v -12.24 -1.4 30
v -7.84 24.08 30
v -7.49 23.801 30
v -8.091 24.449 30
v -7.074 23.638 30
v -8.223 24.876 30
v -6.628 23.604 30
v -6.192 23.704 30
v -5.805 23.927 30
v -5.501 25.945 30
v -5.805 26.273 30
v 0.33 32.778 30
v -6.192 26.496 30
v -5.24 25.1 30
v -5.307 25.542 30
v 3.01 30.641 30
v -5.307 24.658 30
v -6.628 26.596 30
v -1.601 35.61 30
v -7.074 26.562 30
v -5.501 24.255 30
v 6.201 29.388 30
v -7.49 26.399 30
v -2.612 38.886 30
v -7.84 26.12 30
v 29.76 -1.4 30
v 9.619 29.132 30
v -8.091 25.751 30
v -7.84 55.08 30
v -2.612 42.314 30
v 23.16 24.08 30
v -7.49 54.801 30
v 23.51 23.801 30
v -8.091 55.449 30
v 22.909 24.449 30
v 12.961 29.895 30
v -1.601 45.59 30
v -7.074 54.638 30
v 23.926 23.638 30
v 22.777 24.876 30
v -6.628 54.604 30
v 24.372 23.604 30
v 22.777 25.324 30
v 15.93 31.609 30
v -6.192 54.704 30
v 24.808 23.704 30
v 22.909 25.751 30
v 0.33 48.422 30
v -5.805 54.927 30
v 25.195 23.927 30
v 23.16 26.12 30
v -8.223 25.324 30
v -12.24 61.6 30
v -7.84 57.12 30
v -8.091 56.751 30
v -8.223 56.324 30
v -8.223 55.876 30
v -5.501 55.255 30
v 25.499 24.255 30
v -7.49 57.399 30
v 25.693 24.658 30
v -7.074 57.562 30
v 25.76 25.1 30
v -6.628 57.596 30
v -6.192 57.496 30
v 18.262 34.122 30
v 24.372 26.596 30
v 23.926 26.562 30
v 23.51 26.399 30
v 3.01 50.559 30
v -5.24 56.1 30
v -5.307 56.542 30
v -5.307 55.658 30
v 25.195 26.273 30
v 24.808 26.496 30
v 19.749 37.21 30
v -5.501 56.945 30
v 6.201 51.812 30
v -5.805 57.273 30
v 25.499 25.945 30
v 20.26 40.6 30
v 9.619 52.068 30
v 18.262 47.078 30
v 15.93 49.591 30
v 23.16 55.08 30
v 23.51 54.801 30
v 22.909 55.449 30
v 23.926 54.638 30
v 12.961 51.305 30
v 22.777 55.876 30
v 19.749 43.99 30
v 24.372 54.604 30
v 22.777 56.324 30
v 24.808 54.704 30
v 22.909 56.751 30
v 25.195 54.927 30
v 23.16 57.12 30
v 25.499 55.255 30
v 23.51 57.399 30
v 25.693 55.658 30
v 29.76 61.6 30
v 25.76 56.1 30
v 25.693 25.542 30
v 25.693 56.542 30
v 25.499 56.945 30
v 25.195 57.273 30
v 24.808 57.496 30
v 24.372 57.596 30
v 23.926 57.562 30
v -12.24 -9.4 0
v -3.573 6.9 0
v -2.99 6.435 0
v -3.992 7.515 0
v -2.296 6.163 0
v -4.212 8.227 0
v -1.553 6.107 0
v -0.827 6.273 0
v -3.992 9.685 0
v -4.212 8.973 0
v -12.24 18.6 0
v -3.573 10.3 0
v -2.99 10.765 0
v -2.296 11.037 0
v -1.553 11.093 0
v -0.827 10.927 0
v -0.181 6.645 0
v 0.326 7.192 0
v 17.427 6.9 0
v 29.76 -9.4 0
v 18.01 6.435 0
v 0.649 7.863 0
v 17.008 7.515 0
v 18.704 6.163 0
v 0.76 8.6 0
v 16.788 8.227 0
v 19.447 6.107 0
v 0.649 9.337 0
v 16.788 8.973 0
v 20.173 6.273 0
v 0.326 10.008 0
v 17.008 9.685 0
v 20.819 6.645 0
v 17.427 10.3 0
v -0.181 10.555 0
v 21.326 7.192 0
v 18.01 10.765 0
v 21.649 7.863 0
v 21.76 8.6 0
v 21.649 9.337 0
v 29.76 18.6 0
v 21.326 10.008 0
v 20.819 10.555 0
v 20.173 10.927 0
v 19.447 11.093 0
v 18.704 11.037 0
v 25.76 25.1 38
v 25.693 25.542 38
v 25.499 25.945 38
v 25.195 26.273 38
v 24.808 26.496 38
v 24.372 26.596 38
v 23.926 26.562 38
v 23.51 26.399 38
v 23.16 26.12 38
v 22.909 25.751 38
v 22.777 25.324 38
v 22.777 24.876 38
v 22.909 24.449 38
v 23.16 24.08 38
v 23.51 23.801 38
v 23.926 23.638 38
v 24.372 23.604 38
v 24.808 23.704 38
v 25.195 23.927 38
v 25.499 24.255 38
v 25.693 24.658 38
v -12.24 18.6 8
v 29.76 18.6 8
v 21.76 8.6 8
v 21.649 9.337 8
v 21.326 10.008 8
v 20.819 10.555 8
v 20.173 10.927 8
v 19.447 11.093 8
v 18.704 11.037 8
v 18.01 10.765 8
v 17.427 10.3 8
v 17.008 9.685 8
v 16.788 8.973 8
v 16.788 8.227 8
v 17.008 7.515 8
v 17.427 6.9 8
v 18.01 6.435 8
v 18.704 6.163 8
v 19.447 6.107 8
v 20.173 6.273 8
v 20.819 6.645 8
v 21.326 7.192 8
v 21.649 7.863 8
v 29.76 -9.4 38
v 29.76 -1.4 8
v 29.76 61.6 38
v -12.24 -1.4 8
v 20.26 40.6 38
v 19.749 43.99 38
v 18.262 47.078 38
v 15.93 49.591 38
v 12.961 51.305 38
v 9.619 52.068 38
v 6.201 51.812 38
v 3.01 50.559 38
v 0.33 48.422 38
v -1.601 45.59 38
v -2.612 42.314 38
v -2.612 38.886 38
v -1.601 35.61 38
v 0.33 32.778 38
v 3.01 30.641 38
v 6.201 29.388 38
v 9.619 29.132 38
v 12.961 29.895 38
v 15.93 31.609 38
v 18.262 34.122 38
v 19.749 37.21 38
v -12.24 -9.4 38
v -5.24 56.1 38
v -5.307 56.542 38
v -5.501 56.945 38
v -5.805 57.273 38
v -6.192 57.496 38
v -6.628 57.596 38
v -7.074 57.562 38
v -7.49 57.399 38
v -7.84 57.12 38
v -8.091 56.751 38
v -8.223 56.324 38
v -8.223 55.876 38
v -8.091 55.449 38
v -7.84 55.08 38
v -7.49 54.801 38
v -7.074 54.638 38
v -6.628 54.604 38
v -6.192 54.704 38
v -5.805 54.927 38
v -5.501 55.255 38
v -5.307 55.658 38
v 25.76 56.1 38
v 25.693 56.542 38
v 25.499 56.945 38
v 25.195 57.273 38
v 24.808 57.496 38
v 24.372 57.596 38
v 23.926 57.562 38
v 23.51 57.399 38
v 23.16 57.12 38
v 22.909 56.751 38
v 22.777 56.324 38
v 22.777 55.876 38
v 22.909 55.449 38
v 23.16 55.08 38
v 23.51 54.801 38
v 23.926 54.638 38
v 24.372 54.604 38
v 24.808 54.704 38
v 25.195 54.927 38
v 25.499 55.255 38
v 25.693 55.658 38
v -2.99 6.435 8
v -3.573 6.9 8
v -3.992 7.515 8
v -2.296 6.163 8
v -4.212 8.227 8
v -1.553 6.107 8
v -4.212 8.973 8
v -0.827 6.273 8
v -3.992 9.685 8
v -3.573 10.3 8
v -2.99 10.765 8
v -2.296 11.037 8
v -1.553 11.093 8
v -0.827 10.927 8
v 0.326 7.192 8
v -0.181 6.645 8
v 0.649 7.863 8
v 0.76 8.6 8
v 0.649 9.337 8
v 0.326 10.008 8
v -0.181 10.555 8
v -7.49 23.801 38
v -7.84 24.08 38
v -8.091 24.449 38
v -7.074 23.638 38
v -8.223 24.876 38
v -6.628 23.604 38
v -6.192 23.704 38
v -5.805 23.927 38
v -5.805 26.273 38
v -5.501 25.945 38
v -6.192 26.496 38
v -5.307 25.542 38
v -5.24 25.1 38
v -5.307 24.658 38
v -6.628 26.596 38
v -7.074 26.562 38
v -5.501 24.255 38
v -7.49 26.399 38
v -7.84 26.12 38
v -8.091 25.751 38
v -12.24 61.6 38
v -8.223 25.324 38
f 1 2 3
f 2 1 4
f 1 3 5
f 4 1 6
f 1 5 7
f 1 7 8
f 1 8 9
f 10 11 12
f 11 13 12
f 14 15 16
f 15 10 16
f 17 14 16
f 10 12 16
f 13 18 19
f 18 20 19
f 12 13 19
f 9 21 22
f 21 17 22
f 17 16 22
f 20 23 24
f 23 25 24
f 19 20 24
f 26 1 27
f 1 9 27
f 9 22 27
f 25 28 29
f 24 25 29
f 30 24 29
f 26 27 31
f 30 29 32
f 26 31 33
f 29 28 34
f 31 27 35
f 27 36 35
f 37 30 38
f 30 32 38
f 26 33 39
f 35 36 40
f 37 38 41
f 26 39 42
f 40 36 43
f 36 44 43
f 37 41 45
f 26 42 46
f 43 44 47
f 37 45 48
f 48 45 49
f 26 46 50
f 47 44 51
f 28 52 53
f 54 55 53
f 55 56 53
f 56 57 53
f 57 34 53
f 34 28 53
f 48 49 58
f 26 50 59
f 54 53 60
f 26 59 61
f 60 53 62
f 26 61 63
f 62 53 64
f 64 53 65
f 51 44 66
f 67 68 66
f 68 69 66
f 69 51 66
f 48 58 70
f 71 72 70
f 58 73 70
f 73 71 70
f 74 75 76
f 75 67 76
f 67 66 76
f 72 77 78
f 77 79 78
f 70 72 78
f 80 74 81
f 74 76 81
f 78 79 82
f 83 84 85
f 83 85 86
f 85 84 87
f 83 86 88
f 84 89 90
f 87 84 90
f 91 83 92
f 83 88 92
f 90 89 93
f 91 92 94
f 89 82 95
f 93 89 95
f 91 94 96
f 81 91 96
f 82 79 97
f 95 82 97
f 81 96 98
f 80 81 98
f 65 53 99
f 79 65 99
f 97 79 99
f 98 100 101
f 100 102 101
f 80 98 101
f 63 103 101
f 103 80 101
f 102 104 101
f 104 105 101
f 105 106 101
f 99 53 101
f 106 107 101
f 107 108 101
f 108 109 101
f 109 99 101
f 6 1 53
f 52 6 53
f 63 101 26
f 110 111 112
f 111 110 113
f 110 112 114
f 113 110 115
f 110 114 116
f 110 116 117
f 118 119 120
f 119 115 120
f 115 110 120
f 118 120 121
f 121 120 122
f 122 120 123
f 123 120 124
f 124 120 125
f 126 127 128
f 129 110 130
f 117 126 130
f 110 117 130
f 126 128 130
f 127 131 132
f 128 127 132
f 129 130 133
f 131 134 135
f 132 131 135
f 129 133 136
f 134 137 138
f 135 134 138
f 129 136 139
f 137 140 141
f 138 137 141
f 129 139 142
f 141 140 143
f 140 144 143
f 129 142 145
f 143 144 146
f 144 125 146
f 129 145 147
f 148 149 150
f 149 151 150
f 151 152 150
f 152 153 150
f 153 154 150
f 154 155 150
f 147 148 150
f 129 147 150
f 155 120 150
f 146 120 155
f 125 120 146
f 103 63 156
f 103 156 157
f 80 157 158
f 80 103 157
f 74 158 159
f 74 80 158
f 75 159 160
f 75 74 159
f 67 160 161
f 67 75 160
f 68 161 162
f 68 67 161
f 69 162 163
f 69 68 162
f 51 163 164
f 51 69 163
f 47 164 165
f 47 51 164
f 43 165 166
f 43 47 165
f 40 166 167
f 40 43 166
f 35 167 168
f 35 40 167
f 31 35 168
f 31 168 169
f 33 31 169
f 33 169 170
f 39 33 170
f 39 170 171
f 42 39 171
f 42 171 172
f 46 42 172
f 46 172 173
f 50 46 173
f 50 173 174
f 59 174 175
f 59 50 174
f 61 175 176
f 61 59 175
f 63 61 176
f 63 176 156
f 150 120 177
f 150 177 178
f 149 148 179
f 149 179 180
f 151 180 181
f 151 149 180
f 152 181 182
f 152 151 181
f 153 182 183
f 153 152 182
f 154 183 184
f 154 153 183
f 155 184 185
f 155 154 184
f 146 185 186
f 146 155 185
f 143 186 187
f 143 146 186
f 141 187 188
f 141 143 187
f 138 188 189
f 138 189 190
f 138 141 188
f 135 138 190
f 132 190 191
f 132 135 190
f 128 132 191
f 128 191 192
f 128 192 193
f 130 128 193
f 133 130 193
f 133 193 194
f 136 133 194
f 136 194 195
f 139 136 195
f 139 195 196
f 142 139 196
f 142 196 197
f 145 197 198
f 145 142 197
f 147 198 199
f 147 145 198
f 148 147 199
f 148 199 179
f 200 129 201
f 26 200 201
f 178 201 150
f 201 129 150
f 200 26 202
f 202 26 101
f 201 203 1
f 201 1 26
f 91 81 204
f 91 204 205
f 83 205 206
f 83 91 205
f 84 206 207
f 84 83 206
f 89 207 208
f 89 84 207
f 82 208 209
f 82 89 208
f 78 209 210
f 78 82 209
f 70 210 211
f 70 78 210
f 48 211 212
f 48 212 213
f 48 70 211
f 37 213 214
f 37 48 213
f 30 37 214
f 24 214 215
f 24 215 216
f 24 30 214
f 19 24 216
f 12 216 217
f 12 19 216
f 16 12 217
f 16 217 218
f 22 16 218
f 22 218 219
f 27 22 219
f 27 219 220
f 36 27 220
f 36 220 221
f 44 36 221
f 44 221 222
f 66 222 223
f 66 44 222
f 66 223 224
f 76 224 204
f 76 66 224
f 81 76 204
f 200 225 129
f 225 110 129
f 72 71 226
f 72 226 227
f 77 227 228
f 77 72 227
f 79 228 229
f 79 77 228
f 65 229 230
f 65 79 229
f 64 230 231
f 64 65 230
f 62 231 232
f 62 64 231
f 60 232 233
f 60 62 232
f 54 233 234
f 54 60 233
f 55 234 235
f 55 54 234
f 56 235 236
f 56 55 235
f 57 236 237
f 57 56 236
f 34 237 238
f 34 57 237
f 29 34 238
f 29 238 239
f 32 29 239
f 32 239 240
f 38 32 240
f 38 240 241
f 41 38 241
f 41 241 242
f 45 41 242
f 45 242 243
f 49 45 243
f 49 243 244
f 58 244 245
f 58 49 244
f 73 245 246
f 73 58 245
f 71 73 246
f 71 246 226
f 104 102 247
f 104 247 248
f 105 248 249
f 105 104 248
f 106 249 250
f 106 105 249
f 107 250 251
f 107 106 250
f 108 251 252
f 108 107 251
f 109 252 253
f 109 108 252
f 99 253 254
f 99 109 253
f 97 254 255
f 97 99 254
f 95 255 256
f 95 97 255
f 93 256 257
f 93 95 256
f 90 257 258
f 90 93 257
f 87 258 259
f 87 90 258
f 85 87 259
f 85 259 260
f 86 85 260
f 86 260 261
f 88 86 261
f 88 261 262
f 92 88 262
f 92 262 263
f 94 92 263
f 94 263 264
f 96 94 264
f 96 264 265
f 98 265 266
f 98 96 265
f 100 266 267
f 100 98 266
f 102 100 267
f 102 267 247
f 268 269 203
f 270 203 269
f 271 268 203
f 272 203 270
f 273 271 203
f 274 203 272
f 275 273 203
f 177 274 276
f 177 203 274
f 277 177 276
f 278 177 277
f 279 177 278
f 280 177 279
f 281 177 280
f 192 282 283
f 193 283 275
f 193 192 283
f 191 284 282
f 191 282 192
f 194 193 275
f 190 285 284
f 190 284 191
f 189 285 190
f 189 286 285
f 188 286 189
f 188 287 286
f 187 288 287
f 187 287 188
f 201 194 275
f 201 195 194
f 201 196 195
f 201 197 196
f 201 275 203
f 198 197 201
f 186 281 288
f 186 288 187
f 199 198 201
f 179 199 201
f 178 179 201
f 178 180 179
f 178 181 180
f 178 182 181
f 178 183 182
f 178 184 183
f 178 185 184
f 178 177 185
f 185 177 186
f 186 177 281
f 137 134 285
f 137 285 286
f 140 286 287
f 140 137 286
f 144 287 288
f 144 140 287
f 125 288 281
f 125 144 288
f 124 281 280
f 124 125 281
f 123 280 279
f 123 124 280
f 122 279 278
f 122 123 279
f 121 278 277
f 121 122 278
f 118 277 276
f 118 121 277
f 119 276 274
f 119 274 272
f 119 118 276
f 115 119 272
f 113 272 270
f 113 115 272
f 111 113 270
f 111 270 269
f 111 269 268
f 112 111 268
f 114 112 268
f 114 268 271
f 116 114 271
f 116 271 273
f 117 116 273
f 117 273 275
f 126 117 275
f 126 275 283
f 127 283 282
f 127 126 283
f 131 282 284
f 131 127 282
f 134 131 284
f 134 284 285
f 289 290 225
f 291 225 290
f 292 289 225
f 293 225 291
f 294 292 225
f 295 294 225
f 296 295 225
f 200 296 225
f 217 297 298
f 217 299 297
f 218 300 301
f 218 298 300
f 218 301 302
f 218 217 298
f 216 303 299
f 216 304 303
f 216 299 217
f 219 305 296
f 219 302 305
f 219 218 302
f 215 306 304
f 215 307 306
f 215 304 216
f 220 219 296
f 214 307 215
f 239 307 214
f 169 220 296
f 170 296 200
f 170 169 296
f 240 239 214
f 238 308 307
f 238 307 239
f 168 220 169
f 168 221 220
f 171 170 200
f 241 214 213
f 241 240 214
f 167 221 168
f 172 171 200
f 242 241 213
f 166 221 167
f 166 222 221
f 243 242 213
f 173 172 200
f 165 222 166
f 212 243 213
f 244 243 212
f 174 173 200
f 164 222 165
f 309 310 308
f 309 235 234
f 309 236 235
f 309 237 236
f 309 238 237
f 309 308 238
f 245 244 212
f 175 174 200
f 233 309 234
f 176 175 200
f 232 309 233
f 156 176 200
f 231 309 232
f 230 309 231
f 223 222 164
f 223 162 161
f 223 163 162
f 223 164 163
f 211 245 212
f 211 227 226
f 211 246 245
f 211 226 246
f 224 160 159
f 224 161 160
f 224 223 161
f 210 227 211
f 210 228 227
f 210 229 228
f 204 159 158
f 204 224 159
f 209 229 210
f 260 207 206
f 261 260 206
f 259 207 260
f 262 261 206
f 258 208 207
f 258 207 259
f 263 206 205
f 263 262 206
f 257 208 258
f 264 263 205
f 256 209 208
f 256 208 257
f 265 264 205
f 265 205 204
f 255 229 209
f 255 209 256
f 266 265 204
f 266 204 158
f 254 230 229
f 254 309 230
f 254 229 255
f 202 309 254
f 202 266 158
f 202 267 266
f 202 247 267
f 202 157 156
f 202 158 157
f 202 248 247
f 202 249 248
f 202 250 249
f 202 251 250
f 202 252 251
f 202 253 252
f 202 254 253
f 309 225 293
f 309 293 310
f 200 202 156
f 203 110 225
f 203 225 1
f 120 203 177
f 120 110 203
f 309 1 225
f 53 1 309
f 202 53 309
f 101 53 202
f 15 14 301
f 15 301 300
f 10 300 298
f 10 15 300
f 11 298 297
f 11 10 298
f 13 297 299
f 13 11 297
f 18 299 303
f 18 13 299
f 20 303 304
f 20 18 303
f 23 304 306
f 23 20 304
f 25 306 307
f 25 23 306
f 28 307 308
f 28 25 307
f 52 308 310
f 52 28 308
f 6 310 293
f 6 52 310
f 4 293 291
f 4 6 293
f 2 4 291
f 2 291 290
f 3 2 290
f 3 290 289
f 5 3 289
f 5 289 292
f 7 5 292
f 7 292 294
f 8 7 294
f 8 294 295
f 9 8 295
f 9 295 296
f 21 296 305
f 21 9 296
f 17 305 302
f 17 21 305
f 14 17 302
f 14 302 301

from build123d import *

# Parameters (mm, degrees)
SKETCH_1_W      = 42
SKETCH_1_H      = 20
SKETCH_1_R      = 2.5
EXTRUDE_1_DEPTH = 8
SKETCH_1_3_W    = 42
SKETCH_1_3_H    = 8
EXTRUDE_2_DEPTH = 30
SKETCH_2_W      = 42
SKETCH_2_H      = 71
SKETCH_2_R      = 1.5
SKETCH_2_R_2    = 11.5
EXTRUDE_3_DEPTH = 8


with BuildPart() as part:
    # 草图1 → 凸台-拉伸1 (new body)
    with BuildSketch(Plane.XY):
        with Locations((8.76, 8.6)):
            Rectangle(SKETCH_1_W, SKETCH_1_H)
        with Locations((-1.74, 8.6)):
            Circle(SKETCH_1_R, mode=Mode.SUBTRACT)
        with Locations((19.26, 8.6)):
            Circle(SKETCH_1_R, mode=Mode.SUBTRACT)
    extrude(amount=EXTRUDE_1_DEPTH)

    # 草图1<3> → 凸台-拉伸2 (add)
    with BuildSketch(Plane.XY):
        with Locations((8.76, -5.4)):
            Rectangle(SKETCH_1_3_W, SKETCH_1_3_H)
    extrude(amount=EXTRUDE_2_DEPTH)

    # 草图2 → 凸台-拉伸3 (add)
    with BuildSketch(Plane.XY.offset(30)):
        with Locations((8.76, 26.1)):
            Rectangle(SKETCH_2_W, SKETCH_2_H)
        with Locations((24.26, 56.1)):
            Circle(SKETCH_2_R, mode=Mode.SUBTRACT)
        with Locations((-6.74, 56.1)):
            Circle(SKETCH_2_R, mode=Mode.SUBTRACT)
        with Locations((-6.74, 25.1)):
            Circle(SKETCH_2_R, mode=Mode.SUBTRACT)
        with Locations((24.26, 25.1)):
            Circle(SKETCH_2_R, mode=Mode.SUBTRACT)
        with Locations((8.76, 40.6)):
            Circle(SKETCH_2_R_2, mode=Mode.SUBTRACT)
    extrude(amount=EXTRUDE_3_DEPTH)


solid = part.part
